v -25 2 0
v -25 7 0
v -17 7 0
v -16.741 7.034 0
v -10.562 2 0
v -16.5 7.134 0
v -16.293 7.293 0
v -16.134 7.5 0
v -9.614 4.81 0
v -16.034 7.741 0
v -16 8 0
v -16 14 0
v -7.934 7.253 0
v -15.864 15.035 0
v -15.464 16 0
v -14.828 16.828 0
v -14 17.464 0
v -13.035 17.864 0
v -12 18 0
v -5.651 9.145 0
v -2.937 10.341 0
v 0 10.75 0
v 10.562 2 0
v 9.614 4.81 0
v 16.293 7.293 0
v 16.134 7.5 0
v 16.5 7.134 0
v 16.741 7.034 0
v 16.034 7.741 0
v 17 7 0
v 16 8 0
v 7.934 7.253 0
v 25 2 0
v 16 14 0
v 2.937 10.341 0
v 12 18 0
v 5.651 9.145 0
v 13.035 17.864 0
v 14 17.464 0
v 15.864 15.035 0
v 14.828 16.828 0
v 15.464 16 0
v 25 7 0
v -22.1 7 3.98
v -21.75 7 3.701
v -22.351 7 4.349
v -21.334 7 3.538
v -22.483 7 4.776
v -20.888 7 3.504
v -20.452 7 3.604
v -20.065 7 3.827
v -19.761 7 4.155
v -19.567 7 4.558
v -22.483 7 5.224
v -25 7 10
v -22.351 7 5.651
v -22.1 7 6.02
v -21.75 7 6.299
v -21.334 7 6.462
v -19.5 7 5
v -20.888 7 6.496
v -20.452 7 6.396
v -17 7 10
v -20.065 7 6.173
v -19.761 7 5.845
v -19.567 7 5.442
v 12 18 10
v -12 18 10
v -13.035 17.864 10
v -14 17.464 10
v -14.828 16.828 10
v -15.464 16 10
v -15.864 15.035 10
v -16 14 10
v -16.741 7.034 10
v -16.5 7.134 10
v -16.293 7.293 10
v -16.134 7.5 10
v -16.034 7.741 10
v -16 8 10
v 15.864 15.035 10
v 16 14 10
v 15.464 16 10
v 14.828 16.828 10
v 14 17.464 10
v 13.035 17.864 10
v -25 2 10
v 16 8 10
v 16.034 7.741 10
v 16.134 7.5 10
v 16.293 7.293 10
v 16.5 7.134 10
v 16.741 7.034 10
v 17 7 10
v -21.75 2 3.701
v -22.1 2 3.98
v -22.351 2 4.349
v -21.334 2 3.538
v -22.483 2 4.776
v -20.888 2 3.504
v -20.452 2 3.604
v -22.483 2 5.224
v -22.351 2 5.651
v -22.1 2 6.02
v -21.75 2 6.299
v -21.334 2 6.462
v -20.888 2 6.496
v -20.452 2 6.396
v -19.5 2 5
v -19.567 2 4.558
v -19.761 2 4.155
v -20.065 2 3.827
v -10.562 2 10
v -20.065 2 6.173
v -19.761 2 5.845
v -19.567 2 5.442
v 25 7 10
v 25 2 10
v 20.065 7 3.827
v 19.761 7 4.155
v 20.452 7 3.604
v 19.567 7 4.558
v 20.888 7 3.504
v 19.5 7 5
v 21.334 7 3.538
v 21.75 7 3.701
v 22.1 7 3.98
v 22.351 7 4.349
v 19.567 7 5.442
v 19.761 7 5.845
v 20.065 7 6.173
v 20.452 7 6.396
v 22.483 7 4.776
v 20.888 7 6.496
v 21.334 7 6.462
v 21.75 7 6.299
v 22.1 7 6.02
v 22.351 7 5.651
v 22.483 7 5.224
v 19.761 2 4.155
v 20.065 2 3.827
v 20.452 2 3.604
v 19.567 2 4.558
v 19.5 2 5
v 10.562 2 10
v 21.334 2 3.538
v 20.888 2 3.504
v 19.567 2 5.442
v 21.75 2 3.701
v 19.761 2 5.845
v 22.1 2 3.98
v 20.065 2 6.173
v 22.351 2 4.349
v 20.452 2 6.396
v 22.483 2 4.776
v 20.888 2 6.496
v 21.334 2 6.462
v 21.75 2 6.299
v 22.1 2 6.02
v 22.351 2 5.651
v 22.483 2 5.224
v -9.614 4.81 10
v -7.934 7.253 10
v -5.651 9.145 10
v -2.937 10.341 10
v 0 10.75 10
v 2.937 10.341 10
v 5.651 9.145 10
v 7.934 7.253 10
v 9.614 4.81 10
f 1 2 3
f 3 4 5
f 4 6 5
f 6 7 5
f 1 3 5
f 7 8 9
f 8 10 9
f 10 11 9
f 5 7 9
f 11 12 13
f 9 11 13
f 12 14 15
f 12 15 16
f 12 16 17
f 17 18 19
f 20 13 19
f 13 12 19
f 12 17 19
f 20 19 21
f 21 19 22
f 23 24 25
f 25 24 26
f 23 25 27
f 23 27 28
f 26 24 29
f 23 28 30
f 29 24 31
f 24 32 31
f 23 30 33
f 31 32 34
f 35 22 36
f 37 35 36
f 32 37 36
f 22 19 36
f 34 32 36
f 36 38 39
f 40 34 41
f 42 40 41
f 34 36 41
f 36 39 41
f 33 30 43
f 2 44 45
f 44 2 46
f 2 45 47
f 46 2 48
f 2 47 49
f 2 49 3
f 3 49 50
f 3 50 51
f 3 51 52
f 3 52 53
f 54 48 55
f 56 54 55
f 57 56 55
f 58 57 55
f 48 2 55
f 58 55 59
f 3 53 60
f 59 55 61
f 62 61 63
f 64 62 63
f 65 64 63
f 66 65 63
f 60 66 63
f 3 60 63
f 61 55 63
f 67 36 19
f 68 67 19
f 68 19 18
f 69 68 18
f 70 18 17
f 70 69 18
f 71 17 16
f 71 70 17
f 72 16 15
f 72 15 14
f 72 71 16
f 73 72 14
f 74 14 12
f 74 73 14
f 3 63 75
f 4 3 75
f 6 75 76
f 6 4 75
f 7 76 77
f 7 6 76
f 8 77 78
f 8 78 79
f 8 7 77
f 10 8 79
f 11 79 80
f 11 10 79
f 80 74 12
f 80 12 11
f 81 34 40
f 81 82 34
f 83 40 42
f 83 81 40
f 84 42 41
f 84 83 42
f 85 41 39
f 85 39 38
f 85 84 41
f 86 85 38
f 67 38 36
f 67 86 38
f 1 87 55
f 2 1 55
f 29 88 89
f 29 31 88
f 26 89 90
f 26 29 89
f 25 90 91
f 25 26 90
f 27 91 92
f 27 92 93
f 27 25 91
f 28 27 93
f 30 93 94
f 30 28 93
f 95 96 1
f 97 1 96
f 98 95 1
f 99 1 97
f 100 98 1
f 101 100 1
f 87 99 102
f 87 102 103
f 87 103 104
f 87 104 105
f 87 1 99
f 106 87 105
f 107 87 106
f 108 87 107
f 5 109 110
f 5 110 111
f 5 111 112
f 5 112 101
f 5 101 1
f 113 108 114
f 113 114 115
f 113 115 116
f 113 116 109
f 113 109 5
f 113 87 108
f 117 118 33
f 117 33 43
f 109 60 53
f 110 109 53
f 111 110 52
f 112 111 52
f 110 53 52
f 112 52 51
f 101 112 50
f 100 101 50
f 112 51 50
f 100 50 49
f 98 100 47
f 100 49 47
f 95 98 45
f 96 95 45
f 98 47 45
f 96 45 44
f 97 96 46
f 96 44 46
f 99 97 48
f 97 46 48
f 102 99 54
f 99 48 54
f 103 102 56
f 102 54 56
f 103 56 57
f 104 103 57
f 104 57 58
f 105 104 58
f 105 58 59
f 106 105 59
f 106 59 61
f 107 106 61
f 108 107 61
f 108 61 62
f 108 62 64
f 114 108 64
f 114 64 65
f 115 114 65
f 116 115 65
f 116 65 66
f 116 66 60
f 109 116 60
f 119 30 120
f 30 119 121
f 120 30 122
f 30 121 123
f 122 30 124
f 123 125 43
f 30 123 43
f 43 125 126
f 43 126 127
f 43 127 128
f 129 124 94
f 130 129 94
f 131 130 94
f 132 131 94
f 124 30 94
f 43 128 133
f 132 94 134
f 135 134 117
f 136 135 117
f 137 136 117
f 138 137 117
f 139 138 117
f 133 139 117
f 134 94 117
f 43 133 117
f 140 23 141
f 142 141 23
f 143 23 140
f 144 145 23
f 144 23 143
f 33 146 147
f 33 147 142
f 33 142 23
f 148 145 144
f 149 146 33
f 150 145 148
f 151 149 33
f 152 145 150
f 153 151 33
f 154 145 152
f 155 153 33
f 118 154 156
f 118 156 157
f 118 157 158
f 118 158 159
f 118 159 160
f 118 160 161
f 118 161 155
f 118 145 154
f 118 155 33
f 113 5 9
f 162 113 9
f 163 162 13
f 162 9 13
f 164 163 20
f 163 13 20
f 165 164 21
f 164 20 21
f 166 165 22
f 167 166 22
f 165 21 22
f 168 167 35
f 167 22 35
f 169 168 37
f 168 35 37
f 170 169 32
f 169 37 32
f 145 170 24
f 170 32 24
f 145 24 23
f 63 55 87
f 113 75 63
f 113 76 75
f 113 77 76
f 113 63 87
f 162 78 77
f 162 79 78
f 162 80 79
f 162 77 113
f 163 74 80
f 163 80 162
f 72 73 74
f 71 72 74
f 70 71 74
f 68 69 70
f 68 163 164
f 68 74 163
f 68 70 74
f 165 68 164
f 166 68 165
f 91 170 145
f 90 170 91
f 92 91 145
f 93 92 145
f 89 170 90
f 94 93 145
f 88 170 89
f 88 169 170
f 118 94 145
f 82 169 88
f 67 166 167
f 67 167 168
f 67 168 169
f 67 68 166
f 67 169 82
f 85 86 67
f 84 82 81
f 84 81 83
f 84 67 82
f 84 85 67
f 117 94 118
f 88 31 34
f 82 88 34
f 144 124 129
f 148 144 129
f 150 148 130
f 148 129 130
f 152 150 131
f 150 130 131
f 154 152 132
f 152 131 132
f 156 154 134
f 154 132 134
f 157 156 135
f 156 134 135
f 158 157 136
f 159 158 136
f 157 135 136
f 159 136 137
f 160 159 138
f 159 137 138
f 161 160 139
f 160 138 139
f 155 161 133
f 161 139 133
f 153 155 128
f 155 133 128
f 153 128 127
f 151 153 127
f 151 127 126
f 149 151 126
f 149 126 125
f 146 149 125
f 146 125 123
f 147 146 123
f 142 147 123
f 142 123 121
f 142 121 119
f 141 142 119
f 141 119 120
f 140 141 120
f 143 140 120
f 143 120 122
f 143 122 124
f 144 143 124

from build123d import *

# Parameters (mm, degrees)
EXTRUDE_1_DEPTH     = 10
SKETCH_3_W          = 32
SKETCH_3_H          = 2
CUT_EXTRUDE_2_DEPTH = 27.076809621
SKETCH_5_W          = 9
SKETCH_5_H          = 5
EXTRUDE_2_DEPTH     = 10
FILLET_1_R          = 1
SKETCH_6_R          = 1.5
CUT_EXTRUDE_3_DEPTH = 30.086079144
FILLET_2_R          = 4


with BuildPart() as part:
    # 草图1 → 凸台-拉伸1 (new body)
    with BuildSketch(Plane.XY):
        with BuildLine():
            ThreePointArc((-10.75, 0), (0, 10.75), (10.75, 0))
            Line((10.75, 0), (16, 0))
            Line((16, 0), (16, 18))
            Line((16, 18), (-16, 18))
            Line((-16, 18), (-16, 0))
            Line((-16, 0), (-10.75, 0))
        make_face()
    extrude(amount=EXTRUDE_1_DEPTH)

    # 草图3 → 切除-拉伸2 (cut, through all)
    with BuildSketch(Plane.XY.offset(10)):
        with Locations((0, 1)):
            Rectangle(SKETCH_3_W, SKETCH_3_H)
    extrude(amount=-CUT_EXTRUDE_2_DEPTH, mode=Mode.SUBTRACT)

    # 草图5 → 凸台-拉伸2 (add)
    with BuildSketch(Plane.XY.offset(10)):
        with Locations((20.5, 4.5)):
            Rectangle(SKETCH_5_W, SKETCH_5_H)
        with Locations((-20.5, 4.5)):
            Rectangle(SKETCH_5_W, SKETCH_5_H)
    extrude(amount=-EXTRUDE_2_DEPTH)

    # 圆角1
    fillet_1_edges = [part.edges().sort_by_distance(p)[0] for p in [
        (-16, 7, 5),
        (16, 7, 5),
    ]]
    fillet(fillet_1_edges, radius=FILLET_1_R)

    # 草图6 → 切除-拉伸3 (cut, through all)
    with BuildSketch(Plane(origin=(0, 7, 0), x_dir=(1, 0, 0), z_dir=(0, 1, 0))):
        with Locations(Location((21, -5, 0), (0, 0, 180))):
            Circle(SKETCH_6_R)
        with Locations((-21, -5)):
            Circle(SKETCH_6_R)
    extrude(amount=-CUT_EXTRUDE_3_DEPTH, mode=Mode.SUBTRACT)

    # 圆角2
    fillet_2_edges = [part.edges().sort_by_distance(p)[0] for p in [
        (-16, 18, 5),
        (16, 18, 5),
    ]]
    fillet(fillet_2_edges, radius=FILLET_2_R)


solid = part.part
